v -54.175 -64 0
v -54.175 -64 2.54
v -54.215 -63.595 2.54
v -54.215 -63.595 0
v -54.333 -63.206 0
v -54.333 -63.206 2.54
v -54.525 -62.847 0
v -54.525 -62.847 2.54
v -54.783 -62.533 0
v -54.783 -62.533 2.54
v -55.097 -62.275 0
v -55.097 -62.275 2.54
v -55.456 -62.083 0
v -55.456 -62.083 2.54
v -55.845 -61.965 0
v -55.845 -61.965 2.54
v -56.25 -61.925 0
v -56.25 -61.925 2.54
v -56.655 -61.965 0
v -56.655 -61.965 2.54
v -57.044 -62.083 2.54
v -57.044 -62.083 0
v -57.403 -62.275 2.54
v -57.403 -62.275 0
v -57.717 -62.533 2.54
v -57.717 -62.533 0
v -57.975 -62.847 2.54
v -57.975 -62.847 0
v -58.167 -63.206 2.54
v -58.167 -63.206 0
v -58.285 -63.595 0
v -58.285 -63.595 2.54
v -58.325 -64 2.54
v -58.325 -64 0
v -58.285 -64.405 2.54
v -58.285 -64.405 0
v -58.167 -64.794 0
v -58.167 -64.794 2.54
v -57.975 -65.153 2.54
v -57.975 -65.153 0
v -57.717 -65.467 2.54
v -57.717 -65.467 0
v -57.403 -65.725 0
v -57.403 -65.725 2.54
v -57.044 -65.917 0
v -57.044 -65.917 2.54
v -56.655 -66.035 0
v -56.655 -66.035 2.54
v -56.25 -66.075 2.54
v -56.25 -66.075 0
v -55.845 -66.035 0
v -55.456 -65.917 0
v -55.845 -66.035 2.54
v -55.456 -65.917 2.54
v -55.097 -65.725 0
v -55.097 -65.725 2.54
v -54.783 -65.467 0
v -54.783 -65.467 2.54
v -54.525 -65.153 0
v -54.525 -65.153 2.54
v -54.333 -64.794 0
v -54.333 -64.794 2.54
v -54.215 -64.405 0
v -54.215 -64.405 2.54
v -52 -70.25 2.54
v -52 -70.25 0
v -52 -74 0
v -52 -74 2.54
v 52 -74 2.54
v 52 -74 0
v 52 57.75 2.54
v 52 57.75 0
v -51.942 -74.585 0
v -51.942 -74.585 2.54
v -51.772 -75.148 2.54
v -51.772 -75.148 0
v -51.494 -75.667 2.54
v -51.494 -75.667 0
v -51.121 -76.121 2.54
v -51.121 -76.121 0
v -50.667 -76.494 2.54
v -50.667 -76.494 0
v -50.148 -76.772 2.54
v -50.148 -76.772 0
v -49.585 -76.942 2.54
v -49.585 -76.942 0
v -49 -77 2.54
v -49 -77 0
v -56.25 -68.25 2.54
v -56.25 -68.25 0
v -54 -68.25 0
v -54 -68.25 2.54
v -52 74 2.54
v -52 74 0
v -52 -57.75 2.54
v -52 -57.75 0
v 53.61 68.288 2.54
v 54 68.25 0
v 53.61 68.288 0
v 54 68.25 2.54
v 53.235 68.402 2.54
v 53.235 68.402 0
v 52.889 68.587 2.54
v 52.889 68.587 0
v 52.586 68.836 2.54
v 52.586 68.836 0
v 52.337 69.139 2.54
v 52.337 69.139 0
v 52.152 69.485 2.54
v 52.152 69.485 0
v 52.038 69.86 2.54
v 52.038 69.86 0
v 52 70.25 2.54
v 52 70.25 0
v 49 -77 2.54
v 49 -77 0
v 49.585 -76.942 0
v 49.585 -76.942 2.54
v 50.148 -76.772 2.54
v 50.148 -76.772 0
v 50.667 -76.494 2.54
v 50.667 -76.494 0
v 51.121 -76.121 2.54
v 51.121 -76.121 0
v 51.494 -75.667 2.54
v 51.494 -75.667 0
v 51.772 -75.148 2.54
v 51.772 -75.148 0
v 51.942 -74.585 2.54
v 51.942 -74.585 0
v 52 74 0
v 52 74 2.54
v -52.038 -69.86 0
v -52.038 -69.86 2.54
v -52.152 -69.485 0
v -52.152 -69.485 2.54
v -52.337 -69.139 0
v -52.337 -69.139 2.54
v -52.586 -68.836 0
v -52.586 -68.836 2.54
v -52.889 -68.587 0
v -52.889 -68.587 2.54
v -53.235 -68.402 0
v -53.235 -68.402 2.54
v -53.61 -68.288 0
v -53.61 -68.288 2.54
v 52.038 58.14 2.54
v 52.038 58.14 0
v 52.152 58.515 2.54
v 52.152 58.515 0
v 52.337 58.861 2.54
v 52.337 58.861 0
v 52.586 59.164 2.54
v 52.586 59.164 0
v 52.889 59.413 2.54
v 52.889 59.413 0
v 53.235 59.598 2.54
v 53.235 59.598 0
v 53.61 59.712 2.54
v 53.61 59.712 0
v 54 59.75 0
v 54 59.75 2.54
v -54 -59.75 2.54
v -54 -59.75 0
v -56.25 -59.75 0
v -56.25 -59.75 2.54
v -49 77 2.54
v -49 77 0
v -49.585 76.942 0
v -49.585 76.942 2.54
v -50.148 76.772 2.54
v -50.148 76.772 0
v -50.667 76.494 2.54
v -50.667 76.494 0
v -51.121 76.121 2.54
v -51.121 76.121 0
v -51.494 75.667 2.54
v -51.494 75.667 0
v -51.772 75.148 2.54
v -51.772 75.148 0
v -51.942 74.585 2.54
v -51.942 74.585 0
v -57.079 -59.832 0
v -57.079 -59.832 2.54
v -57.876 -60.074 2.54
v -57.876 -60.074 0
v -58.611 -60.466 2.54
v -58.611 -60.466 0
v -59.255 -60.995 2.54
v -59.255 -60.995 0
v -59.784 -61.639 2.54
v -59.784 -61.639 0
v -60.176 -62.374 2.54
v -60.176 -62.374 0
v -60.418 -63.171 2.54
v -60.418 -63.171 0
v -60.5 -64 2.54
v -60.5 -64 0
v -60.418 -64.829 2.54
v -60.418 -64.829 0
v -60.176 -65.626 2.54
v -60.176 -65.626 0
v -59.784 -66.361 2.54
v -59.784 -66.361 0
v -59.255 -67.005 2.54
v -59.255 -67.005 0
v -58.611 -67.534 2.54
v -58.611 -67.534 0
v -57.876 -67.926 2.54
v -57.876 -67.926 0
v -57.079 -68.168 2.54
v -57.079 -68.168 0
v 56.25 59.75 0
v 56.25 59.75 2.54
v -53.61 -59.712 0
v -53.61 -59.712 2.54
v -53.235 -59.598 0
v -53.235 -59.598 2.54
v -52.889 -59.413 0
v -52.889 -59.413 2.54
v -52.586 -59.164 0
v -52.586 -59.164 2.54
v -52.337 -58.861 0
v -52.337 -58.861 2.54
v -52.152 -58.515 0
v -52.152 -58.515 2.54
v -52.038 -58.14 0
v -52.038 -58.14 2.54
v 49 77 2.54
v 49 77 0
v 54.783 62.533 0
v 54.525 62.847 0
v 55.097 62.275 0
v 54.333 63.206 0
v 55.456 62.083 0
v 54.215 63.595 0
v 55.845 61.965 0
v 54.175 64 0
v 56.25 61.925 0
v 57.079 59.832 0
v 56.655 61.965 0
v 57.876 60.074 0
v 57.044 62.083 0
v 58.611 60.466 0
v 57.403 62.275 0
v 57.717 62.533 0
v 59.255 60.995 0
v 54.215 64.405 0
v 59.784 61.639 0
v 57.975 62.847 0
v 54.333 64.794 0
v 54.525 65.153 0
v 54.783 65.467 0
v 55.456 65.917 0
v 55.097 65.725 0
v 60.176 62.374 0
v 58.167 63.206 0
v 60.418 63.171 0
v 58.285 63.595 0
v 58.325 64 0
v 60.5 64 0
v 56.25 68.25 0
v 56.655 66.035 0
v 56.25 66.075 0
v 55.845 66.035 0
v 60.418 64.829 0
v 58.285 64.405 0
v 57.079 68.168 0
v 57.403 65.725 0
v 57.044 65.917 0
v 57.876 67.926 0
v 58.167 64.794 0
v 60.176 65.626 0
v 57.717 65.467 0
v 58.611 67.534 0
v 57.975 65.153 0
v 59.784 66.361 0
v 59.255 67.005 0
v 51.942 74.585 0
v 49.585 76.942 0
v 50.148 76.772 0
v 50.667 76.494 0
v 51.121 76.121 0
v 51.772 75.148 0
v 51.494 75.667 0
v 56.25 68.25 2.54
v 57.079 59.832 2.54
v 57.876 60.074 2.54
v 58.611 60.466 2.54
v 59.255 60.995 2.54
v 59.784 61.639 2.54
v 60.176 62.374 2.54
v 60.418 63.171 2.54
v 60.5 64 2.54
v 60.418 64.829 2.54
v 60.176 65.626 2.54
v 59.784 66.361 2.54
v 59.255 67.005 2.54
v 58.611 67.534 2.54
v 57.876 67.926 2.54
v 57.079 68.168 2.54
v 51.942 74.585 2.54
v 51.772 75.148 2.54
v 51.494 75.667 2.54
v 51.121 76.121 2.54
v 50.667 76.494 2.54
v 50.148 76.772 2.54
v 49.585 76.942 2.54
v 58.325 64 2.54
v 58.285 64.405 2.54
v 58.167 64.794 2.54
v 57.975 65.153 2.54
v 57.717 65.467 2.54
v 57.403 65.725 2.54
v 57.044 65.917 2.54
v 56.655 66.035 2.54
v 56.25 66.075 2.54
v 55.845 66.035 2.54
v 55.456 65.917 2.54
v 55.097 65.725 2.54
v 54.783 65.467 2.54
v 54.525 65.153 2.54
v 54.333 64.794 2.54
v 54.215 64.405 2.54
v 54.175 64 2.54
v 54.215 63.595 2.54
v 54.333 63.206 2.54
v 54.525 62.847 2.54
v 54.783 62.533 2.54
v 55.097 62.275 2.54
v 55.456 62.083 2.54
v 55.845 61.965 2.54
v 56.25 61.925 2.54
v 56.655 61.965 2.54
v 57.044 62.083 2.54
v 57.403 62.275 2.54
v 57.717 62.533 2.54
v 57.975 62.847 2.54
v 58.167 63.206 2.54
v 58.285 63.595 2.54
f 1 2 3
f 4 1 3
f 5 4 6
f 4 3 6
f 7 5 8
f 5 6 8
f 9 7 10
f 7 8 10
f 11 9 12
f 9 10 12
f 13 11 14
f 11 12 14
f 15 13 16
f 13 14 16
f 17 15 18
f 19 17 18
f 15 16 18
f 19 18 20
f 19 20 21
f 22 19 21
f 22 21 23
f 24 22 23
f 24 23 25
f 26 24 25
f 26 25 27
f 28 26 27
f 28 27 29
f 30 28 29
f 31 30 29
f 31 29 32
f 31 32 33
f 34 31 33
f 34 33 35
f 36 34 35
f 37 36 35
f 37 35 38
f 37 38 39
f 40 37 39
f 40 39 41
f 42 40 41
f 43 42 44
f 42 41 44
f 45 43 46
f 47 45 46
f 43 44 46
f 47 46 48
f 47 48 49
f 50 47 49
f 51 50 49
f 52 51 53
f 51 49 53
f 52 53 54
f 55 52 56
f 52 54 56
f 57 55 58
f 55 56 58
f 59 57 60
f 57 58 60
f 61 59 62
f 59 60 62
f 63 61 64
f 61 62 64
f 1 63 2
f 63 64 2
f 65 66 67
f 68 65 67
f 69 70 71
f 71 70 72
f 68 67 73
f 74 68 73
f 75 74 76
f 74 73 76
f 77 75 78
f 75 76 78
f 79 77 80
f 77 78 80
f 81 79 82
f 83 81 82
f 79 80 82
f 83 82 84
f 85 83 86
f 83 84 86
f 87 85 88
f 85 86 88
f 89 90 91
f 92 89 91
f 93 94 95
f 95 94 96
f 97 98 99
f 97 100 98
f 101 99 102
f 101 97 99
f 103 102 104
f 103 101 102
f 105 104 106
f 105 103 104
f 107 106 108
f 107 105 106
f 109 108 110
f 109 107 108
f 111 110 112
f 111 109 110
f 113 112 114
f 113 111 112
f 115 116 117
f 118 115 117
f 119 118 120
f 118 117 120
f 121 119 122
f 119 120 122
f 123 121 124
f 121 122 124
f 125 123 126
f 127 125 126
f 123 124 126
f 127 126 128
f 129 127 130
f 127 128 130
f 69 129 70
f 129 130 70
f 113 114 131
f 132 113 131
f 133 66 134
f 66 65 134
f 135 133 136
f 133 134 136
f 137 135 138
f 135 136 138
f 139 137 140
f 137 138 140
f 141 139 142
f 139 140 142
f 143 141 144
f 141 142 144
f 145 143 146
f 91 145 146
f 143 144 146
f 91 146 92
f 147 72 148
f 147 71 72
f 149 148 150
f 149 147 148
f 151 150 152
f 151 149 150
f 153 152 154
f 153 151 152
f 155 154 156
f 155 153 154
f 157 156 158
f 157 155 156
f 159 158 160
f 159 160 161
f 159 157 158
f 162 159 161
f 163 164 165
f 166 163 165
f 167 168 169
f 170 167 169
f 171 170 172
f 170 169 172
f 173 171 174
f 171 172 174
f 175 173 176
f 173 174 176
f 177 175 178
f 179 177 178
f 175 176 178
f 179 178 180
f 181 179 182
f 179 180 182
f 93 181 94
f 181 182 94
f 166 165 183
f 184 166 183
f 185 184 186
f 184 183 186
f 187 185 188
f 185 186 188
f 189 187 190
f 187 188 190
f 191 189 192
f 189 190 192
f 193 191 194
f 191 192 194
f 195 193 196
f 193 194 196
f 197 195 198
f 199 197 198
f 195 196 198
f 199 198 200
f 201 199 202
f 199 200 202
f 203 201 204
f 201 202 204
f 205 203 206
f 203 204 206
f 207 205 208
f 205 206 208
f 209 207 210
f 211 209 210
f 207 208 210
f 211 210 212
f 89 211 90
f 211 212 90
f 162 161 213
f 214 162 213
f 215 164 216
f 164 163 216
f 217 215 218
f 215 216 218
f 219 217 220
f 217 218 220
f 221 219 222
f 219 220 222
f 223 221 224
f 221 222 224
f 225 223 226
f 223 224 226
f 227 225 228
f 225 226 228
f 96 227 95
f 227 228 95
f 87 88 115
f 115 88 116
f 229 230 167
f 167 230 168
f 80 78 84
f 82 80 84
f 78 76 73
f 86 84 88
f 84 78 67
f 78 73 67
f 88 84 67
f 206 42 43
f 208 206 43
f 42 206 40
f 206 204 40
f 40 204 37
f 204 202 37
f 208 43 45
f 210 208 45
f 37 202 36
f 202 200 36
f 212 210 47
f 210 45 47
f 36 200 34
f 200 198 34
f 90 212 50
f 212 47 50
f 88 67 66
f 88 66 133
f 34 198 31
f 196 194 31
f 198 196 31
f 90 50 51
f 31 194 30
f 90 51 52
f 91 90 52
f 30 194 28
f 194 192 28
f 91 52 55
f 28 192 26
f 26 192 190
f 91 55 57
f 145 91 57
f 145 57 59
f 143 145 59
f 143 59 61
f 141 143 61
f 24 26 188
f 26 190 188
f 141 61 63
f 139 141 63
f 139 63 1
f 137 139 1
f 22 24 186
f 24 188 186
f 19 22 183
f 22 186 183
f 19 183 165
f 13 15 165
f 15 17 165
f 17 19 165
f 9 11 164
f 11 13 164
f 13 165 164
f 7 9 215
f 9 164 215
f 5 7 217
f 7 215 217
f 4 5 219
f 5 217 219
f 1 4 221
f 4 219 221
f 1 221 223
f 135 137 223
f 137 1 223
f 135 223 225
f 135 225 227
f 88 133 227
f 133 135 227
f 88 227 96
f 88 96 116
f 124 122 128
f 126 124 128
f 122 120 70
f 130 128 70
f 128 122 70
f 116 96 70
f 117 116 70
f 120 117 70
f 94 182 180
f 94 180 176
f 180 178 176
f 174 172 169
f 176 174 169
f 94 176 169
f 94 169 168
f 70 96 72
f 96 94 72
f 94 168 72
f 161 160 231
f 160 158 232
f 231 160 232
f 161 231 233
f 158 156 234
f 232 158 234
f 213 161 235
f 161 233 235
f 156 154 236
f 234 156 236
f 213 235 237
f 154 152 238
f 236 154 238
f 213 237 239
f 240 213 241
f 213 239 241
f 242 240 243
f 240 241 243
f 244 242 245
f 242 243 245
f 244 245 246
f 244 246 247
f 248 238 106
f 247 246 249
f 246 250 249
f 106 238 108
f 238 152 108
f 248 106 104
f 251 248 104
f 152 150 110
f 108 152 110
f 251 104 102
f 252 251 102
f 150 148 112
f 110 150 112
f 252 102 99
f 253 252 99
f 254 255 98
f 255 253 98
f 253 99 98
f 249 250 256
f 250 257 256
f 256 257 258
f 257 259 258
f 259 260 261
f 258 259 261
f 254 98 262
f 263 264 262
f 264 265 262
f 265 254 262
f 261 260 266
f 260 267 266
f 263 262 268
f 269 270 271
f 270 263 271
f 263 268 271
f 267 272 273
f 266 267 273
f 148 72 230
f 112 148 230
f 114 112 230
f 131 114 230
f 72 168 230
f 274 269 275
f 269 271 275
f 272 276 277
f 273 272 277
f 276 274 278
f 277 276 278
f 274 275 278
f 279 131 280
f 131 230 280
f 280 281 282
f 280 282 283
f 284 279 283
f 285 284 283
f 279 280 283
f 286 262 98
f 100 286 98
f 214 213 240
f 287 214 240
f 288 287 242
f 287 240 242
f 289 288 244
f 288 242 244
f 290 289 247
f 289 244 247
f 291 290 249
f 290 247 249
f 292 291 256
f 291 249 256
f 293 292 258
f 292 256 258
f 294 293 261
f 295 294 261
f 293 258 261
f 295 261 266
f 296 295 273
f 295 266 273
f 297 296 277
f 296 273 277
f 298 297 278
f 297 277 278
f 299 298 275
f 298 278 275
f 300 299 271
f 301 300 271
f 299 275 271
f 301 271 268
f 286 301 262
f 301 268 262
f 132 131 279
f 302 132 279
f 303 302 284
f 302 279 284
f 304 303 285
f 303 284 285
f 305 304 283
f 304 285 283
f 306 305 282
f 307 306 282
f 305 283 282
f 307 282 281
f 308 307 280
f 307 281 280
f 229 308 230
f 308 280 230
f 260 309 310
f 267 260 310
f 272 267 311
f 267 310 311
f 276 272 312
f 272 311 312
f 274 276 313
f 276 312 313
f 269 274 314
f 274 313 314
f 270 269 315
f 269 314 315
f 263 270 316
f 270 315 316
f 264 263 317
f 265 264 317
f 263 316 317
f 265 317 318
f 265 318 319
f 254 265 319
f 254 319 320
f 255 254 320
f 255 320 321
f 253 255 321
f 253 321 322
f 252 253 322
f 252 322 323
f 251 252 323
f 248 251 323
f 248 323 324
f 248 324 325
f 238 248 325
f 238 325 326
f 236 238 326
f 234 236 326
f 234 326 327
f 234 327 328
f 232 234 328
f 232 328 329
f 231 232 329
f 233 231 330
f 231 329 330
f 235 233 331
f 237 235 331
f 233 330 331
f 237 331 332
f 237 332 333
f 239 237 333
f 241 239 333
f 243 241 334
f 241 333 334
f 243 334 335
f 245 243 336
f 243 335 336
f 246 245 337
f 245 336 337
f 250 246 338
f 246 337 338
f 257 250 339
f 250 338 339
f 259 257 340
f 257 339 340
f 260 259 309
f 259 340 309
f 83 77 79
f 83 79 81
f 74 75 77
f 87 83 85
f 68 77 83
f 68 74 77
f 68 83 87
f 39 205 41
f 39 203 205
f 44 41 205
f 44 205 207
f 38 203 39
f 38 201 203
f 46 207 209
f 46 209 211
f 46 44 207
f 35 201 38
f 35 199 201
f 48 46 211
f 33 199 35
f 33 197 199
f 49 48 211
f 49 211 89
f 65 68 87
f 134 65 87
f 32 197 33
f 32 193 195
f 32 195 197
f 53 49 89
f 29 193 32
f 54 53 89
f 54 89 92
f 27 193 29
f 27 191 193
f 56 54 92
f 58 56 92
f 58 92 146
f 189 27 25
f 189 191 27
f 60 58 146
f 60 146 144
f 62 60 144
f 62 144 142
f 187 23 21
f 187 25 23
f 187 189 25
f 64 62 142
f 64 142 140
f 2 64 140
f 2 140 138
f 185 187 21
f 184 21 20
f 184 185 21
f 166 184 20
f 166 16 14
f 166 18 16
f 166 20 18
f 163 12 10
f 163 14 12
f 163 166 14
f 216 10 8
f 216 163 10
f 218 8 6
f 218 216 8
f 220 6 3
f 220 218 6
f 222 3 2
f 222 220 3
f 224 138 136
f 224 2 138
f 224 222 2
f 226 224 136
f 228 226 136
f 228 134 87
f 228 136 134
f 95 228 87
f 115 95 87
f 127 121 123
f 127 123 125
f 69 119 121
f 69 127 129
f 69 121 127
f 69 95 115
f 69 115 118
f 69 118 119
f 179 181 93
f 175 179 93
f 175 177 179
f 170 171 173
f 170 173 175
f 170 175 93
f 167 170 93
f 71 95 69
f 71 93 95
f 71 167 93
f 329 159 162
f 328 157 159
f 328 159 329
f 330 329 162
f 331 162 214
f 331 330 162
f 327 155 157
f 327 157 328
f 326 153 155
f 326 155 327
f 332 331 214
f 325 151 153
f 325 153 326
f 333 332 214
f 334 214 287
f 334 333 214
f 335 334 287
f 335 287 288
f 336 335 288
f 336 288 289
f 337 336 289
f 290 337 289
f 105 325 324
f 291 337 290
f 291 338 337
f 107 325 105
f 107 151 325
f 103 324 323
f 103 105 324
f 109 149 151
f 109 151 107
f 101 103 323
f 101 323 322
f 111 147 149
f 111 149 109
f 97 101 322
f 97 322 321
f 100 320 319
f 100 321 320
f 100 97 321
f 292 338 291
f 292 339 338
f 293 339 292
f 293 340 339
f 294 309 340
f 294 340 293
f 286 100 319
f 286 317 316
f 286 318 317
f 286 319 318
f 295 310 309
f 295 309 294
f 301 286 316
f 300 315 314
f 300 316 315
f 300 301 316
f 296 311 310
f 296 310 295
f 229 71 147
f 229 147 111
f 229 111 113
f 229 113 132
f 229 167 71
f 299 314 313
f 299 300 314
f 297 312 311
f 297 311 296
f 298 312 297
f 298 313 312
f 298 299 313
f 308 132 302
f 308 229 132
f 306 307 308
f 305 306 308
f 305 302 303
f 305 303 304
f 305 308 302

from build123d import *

# Parameters (mm, degrees)
BOSS_EXTRUDE1_DEPTH = 2.54
SKETCH2_R           = 2.075
CUT_EXTRUDE1_DEPTH  = 10
FILLET1_R           = 2


with BuildPart() as part:
    # Sketch1 → Boss-Extrude1 (new body)
    with BuildSketch(Plane.XY):
        with BuildLine():
            Line((52, -74), (52, 59.75))
            Line((52, 59.75), (56.25, 59.75))
            ThreePointArc((56.25, 59.75), (60.5, 64), (56.25, 68.25))
            Line((56.25, 68.25), (52, 68.25))
            Line((52, 68.25), (52, 74))
            ThreePointArc((52, 74), (51.121320344, 76.121320344), (49, 77))
            Line((49, 77), (-49, 77))
            ThreePointArc((-49, 77), (-51.121320344, 76.121320344), (-52, 74))
            Line((-52, 74), (-52, -59.75))
            Line((-52, -59.75), (-56.25, -59.75))
            ThreePointArc((-56.25, -59.75), (-60.5, -64), (-56.25, -68.25))
            Line((-56.25, -68.25), (-52, -68.25))
            Line((-52, -68.25), (-52, -74))
            ThreePointArc((-52, -74), (-51.121320344, -76.121320344), (-49, -77))
            Line((-49, -77), (49, -77))
            ThreePointArc((49, -77), (51.121320344, -76.121320344), (52, -74))
        make_face()
    extrude(amount=BOSS_EXTRUDE1_DEPTH)

    # Sketch2 → Cut-Extrude1 (cut)
    with BuildSketch(Plane.XY.offset(2.54)):
        with Locations((56.25, 64)):
            Circle(SKETCH2_R)
        with Locations((-56.25, -64)):
            Circle(SKETCH2_R)
    extrude(amount=-CUT_EXTRUDE1_DEPTH, mode=Mode.SUBTRACT)

    # Fillet1
    fillet1_edges = [part.edges().sort_by_distance(p)[0] for p in [
        (-52, -68.25, 1.27),
        (-52, -59.75, 1.27),
        (52, 68.25, 1.27),
        (52, 59.75, 1.27),
    ]]
    fillet(fillet1_edges, radius=FILLET1_R)


solid = part.part
